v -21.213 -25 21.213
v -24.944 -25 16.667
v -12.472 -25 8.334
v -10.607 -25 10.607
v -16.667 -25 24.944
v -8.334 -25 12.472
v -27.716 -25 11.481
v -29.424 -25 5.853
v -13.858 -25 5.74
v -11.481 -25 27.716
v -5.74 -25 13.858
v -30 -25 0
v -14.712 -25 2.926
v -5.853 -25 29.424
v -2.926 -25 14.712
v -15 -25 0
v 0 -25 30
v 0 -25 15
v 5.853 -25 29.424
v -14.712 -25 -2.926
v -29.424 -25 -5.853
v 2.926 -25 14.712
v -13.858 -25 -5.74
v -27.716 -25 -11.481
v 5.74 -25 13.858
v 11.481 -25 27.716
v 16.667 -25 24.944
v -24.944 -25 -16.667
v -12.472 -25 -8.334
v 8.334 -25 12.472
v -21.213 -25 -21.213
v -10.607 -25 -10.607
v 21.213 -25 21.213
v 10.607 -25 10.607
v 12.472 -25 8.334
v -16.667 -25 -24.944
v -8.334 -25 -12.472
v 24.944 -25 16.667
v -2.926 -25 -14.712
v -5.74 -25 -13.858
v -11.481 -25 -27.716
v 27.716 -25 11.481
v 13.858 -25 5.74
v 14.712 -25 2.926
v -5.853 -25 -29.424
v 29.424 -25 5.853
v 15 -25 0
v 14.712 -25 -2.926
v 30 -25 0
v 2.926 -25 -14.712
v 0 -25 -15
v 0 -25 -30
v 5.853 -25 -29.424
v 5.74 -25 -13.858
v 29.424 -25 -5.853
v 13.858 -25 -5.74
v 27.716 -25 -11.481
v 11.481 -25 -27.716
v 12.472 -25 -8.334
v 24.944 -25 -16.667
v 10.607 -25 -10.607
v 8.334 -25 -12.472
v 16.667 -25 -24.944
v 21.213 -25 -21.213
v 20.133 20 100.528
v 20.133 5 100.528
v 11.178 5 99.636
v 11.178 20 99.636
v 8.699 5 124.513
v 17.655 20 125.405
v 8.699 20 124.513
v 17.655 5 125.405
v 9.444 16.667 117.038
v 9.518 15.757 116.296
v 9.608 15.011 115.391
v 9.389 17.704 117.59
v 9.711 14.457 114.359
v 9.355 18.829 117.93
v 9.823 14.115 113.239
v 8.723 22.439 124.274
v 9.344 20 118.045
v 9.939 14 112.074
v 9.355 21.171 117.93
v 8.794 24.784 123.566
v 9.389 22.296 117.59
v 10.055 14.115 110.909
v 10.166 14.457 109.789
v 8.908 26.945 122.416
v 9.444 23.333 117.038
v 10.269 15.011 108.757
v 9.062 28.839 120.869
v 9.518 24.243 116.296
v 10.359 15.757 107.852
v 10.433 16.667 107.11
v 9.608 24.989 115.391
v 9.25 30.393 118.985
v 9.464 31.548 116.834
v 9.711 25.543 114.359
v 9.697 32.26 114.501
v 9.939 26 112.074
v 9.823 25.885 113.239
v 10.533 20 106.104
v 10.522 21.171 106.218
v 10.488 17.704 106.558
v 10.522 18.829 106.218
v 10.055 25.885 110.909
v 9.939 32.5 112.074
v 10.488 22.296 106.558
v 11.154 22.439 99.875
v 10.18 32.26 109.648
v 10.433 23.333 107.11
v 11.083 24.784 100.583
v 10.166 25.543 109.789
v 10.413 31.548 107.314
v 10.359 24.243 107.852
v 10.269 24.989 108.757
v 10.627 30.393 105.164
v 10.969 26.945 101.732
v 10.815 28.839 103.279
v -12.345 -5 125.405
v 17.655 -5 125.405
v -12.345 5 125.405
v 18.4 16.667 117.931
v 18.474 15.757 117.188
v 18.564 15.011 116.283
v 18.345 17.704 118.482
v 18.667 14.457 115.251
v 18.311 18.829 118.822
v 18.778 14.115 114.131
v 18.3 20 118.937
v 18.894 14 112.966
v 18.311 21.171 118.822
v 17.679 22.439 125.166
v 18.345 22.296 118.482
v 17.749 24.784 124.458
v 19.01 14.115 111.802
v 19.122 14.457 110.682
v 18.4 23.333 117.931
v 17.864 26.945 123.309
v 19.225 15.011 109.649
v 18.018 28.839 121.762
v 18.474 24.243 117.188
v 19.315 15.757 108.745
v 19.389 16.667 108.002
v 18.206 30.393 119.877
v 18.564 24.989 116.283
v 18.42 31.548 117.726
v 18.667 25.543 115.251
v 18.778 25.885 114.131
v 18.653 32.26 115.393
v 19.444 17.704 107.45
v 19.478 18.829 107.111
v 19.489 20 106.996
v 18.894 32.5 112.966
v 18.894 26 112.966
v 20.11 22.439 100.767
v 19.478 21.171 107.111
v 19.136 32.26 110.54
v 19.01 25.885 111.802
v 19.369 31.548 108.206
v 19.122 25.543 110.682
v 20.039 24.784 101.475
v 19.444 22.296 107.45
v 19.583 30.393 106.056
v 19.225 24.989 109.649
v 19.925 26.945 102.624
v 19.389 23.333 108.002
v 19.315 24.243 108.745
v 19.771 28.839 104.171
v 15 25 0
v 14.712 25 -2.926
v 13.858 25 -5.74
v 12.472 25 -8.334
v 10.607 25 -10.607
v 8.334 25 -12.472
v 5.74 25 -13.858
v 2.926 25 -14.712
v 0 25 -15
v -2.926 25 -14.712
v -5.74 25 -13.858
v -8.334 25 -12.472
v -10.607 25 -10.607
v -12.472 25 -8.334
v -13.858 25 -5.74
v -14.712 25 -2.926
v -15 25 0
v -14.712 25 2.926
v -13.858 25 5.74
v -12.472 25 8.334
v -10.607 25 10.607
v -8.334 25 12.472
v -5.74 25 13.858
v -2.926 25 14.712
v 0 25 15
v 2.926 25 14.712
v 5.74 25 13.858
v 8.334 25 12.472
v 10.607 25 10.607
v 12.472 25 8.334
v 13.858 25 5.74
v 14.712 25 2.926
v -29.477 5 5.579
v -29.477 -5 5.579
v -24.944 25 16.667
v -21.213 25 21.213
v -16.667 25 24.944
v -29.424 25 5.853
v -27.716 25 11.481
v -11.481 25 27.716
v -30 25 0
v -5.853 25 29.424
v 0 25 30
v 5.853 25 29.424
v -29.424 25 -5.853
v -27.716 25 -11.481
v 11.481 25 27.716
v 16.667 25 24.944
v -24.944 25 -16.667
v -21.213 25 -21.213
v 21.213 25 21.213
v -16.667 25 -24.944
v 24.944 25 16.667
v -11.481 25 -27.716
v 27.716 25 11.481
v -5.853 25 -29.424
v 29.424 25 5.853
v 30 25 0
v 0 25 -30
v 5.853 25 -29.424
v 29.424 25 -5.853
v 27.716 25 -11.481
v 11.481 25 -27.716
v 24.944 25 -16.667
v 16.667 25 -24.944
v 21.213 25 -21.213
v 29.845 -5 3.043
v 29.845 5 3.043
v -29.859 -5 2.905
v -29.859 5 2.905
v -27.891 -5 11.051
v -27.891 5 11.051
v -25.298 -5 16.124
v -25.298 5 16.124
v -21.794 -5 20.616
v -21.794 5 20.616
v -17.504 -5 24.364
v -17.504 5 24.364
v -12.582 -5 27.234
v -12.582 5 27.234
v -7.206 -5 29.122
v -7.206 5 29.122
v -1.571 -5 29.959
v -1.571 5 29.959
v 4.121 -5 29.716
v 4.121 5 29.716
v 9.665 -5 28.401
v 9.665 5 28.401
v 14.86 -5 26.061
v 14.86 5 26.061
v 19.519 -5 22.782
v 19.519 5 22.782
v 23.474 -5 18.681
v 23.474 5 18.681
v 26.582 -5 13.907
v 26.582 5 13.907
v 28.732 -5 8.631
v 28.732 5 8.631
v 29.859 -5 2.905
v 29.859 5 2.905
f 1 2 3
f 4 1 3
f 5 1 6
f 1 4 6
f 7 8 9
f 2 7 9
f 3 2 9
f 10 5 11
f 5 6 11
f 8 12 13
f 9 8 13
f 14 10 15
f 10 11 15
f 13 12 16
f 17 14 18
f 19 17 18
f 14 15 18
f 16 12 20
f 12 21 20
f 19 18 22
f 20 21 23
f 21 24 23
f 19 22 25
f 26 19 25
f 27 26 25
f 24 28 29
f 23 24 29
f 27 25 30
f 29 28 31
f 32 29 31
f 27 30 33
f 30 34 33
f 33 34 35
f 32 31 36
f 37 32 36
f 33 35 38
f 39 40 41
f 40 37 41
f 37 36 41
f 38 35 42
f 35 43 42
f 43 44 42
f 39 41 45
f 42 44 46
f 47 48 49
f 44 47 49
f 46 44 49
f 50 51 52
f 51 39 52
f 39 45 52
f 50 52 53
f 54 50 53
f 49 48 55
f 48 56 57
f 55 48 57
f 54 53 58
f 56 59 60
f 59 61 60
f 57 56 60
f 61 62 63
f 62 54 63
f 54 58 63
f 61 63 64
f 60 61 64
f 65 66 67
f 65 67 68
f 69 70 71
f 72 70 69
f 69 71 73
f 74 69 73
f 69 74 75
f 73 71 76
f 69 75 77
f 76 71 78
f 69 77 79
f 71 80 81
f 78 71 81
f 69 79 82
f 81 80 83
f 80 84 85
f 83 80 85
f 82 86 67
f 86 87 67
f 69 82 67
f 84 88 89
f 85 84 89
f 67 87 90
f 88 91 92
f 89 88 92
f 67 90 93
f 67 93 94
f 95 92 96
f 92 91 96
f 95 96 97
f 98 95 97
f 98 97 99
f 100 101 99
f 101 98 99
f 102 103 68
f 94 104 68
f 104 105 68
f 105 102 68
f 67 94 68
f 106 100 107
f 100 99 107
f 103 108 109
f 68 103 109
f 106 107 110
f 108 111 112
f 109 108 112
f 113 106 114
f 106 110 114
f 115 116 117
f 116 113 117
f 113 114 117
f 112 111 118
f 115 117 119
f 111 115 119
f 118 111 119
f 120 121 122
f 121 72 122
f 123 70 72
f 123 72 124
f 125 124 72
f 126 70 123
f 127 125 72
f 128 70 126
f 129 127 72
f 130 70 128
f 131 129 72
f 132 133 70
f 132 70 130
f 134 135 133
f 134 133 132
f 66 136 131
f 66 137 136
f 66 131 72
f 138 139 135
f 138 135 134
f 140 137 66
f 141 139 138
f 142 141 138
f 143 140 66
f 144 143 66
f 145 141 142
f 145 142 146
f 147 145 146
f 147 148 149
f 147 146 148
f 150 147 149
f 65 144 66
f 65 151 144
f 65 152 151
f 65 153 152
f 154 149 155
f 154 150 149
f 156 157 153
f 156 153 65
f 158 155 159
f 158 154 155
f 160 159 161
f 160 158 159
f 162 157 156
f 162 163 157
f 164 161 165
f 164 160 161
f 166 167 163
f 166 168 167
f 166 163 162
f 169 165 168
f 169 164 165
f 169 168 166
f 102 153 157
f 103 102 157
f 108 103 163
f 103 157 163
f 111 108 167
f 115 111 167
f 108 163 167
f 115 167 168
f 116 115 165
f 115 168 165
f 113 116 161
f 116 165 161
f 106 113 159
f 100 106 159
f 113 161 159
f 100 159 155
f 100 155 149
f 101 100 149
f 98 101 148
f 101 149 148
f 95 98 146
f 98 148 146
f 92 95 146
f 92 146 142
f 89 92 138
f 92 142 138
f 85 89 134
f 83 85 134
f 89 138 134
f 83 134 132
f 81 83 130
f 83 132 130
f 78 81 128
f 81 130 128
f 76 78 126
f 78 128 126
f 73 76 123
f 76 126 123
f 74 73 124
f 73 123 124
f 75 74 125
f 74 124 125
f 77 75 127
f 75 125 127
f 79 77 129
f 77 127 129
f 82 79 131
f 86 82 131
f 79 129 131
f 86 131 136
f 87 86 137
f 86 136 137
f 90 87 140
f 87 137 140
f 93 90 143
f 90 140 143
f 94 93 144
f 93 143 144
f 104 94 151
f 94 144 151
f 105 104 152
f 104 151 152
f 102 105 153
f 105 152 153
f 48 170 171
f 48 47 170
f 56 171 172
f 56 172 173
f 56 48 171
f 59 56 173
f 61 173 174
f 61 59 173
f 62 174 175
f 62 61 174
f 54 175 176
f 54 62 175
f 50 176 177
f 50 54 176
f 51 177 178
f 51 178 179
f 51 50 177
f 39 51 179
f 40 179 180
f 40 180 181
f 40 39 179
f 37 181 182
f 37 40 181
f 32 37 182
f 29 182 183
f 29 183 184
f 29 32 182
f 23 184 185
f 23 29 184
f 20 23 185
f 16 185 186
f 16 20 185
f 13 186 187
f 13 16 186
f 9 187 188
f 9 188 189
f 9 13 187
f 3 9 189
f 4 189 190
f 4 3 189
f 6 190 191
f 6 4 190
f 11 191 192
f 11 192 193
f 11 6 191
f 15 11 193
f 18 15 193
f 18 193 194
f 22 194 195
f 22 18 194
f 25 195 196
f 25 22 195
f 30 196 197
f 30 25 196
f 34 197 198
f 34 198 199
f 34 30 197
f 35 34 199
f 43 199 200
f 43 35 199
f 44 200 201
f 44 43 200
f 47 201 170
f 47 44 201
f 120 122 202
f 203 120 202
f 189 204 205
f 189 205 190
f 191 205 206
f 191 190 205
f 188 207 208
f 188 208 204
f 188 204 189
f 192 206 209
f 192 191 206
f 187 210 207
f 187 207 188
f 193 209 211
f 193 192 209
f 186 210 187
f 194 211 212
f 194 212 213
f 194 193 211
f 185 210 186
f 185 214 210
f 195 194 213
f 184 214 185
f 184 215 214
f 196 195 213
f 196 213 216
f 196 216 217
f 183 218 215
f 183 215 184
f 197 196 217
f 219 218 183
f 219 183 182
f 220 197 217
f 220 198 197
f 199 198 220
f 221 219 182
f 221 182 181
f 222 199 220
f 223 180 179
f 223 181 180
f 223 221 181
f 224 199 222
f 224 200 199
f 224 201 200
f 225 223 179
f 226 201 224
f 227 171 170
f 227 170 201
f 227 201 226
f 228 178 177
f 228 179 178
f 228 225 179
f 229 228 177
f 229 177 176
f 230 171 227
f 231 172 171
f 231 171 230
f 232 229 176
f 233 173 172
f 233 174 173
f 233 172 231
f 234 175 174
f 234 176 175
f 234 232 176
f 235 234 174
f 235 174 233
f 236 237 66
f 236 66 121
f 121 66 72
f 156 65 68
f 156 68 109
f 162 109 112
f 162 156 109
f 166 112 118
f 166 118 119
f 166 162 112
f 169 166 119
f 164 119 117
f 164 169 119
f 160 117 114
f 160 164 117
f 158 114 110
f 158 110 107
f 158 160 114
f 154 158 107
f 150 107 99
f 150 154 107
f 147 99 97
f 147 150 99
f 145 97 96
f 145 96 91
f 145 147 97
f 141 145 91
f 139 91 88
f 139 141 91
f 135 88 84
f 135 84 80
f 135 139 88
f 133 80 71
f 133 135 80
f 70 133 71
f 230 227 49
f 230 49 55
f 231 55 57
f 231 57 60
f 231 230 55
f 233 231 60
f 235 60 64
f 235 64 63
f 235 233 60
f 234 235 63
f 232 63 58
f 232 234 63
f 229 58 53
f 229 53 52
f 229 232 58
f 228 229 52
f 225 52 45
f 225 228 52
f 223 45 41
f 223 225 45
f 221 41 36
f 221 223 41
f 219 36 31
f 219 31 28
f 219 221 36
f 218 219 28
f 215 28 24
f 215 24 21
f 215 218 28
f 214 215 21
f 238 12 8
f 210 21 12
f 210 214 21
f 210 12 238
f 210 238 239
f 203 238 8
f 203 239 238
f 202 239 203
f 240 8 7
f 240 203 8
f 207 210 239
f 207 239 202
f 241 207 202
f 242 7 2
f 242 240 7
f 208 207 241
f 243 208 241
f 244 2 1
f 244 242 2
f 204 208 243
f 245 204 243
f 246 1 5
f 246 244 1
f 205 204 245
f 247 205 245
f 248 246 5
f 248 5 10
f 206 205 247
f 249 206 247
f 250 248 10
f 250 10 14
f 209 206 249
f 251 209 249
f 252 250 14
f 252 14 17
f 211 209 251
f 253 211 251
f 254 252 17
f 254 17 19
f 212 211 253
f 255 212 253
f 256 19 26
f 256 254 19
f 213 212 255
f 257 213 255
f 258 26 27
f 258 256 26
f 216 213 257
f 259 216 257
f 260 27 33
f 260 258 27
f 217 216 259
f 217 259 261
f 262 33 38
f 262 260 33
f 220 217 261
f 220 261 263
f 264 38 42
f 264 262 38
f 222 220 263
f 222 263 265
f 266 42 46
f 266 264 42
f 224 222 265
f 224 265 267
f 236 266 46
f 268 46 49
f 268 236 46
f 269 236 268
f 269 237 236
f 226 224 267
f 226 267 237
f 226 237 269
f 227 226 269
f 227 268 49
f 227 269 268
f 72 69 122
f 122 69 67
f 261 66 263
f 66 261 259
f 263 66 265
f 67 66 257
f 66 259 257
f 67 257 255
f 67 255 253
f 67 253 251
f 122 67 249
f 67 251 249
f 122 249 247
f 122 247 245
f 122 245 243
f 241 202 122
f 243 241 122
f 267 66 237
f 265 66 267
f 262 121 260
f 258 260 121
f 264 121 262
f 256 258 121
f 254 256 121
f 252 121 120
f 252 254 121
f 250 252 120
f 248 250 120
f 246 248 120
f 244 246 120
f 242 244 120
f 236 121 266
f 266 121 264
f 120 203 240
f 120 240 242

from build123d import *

# Parameters (mm, degrees)
SKETCH9_R           = 30
SKETCH9_R_2         = 15
BOSS_EXTRUDE4_DEPTH = 25
BOSS_EXTRUDE5_DEPTH = 5
CUT_EXTRUDE2_DEPTH  = 99
SKETCH12_R          = 6
BOSS_EXTRUDE6_DEPTH = 9


with BuildPart() as part:
    # Sketch9 → Boss-Extrude4 (new body, symmetric)
    with BuildSketch(Plane(origin=(0, 0, 0), x_dir=(1, 0, 0), z_dir=(0, 1, 0))):
        Circle(SKETCH9_R)
        Circle(SKETCH9_R_2, mode=Mode.SUBTRACT)
    extrude(amount=BOSS_EXTRUDE4_DEPTH, both=True)

    # Sketch10 → Boss-Extrude5 (add, symmetric)
    with BuildSketch(Plane(origin=(0, 0, 0), x_dir=(1, 0, 0), z_dir=(0, 1, 0))):
        Polygon((29.859037173, -2.904806205), (17.655167851, -125.404806205), (-12.344832149, -125.404806205), (-29.859037173, -2.904806205), align=None)
    extrude(amount=BOSS_EXTRUDE5_DEPTH, both=True)

    # Sketch11 → Cut-Extrude2 (cut)
    with BuildSketch(Plane(origin=(0, 5, 0), x_dir=(1, 0, 0), z_dir=(0, 1, 0))):
        with BuildLine():
            Line((-14.716049093, -2.904806205), (14.716049093, -2.904806205))
            ThreePointArc((14.716049093, -2.904806205), (0, -15), (-14.716049093, -2.904806205))
        make_face()
    extrude(amount=-CUT_EXTRUDE2_DEPTH, mode=Mode.SUBTRACT)

    # Sketch12 → Boss-Extrude6 (add)
    with BuildSketch(Plane(origin=(29.852146538, 0, 2.973973023), x_dir=(0.0991327, 0, -0.995074222), z_dir=(0.995074222, 0, 0.0991327))):
        with BuildLine():
            Line((-123.036885537, 20), (-123.036885537, 5))
            Line((-123.036885537, 5), (-98.036885537, 5))
            Line((-98.036885537, 5), (-98.036885537, 20))
            ThreePointArc((-98.036885537, 20), (-110.536885537, 32.5), (-123.036885537, 20))
        make_face()
        with Locations((-110.536885537, 20)):
            Circle(SKETCH12_R, mode=Mode.SUBTRACT)
    extrude(amount=-BOSS_EXTRUDE6_DEPTH)


solid = part.part
